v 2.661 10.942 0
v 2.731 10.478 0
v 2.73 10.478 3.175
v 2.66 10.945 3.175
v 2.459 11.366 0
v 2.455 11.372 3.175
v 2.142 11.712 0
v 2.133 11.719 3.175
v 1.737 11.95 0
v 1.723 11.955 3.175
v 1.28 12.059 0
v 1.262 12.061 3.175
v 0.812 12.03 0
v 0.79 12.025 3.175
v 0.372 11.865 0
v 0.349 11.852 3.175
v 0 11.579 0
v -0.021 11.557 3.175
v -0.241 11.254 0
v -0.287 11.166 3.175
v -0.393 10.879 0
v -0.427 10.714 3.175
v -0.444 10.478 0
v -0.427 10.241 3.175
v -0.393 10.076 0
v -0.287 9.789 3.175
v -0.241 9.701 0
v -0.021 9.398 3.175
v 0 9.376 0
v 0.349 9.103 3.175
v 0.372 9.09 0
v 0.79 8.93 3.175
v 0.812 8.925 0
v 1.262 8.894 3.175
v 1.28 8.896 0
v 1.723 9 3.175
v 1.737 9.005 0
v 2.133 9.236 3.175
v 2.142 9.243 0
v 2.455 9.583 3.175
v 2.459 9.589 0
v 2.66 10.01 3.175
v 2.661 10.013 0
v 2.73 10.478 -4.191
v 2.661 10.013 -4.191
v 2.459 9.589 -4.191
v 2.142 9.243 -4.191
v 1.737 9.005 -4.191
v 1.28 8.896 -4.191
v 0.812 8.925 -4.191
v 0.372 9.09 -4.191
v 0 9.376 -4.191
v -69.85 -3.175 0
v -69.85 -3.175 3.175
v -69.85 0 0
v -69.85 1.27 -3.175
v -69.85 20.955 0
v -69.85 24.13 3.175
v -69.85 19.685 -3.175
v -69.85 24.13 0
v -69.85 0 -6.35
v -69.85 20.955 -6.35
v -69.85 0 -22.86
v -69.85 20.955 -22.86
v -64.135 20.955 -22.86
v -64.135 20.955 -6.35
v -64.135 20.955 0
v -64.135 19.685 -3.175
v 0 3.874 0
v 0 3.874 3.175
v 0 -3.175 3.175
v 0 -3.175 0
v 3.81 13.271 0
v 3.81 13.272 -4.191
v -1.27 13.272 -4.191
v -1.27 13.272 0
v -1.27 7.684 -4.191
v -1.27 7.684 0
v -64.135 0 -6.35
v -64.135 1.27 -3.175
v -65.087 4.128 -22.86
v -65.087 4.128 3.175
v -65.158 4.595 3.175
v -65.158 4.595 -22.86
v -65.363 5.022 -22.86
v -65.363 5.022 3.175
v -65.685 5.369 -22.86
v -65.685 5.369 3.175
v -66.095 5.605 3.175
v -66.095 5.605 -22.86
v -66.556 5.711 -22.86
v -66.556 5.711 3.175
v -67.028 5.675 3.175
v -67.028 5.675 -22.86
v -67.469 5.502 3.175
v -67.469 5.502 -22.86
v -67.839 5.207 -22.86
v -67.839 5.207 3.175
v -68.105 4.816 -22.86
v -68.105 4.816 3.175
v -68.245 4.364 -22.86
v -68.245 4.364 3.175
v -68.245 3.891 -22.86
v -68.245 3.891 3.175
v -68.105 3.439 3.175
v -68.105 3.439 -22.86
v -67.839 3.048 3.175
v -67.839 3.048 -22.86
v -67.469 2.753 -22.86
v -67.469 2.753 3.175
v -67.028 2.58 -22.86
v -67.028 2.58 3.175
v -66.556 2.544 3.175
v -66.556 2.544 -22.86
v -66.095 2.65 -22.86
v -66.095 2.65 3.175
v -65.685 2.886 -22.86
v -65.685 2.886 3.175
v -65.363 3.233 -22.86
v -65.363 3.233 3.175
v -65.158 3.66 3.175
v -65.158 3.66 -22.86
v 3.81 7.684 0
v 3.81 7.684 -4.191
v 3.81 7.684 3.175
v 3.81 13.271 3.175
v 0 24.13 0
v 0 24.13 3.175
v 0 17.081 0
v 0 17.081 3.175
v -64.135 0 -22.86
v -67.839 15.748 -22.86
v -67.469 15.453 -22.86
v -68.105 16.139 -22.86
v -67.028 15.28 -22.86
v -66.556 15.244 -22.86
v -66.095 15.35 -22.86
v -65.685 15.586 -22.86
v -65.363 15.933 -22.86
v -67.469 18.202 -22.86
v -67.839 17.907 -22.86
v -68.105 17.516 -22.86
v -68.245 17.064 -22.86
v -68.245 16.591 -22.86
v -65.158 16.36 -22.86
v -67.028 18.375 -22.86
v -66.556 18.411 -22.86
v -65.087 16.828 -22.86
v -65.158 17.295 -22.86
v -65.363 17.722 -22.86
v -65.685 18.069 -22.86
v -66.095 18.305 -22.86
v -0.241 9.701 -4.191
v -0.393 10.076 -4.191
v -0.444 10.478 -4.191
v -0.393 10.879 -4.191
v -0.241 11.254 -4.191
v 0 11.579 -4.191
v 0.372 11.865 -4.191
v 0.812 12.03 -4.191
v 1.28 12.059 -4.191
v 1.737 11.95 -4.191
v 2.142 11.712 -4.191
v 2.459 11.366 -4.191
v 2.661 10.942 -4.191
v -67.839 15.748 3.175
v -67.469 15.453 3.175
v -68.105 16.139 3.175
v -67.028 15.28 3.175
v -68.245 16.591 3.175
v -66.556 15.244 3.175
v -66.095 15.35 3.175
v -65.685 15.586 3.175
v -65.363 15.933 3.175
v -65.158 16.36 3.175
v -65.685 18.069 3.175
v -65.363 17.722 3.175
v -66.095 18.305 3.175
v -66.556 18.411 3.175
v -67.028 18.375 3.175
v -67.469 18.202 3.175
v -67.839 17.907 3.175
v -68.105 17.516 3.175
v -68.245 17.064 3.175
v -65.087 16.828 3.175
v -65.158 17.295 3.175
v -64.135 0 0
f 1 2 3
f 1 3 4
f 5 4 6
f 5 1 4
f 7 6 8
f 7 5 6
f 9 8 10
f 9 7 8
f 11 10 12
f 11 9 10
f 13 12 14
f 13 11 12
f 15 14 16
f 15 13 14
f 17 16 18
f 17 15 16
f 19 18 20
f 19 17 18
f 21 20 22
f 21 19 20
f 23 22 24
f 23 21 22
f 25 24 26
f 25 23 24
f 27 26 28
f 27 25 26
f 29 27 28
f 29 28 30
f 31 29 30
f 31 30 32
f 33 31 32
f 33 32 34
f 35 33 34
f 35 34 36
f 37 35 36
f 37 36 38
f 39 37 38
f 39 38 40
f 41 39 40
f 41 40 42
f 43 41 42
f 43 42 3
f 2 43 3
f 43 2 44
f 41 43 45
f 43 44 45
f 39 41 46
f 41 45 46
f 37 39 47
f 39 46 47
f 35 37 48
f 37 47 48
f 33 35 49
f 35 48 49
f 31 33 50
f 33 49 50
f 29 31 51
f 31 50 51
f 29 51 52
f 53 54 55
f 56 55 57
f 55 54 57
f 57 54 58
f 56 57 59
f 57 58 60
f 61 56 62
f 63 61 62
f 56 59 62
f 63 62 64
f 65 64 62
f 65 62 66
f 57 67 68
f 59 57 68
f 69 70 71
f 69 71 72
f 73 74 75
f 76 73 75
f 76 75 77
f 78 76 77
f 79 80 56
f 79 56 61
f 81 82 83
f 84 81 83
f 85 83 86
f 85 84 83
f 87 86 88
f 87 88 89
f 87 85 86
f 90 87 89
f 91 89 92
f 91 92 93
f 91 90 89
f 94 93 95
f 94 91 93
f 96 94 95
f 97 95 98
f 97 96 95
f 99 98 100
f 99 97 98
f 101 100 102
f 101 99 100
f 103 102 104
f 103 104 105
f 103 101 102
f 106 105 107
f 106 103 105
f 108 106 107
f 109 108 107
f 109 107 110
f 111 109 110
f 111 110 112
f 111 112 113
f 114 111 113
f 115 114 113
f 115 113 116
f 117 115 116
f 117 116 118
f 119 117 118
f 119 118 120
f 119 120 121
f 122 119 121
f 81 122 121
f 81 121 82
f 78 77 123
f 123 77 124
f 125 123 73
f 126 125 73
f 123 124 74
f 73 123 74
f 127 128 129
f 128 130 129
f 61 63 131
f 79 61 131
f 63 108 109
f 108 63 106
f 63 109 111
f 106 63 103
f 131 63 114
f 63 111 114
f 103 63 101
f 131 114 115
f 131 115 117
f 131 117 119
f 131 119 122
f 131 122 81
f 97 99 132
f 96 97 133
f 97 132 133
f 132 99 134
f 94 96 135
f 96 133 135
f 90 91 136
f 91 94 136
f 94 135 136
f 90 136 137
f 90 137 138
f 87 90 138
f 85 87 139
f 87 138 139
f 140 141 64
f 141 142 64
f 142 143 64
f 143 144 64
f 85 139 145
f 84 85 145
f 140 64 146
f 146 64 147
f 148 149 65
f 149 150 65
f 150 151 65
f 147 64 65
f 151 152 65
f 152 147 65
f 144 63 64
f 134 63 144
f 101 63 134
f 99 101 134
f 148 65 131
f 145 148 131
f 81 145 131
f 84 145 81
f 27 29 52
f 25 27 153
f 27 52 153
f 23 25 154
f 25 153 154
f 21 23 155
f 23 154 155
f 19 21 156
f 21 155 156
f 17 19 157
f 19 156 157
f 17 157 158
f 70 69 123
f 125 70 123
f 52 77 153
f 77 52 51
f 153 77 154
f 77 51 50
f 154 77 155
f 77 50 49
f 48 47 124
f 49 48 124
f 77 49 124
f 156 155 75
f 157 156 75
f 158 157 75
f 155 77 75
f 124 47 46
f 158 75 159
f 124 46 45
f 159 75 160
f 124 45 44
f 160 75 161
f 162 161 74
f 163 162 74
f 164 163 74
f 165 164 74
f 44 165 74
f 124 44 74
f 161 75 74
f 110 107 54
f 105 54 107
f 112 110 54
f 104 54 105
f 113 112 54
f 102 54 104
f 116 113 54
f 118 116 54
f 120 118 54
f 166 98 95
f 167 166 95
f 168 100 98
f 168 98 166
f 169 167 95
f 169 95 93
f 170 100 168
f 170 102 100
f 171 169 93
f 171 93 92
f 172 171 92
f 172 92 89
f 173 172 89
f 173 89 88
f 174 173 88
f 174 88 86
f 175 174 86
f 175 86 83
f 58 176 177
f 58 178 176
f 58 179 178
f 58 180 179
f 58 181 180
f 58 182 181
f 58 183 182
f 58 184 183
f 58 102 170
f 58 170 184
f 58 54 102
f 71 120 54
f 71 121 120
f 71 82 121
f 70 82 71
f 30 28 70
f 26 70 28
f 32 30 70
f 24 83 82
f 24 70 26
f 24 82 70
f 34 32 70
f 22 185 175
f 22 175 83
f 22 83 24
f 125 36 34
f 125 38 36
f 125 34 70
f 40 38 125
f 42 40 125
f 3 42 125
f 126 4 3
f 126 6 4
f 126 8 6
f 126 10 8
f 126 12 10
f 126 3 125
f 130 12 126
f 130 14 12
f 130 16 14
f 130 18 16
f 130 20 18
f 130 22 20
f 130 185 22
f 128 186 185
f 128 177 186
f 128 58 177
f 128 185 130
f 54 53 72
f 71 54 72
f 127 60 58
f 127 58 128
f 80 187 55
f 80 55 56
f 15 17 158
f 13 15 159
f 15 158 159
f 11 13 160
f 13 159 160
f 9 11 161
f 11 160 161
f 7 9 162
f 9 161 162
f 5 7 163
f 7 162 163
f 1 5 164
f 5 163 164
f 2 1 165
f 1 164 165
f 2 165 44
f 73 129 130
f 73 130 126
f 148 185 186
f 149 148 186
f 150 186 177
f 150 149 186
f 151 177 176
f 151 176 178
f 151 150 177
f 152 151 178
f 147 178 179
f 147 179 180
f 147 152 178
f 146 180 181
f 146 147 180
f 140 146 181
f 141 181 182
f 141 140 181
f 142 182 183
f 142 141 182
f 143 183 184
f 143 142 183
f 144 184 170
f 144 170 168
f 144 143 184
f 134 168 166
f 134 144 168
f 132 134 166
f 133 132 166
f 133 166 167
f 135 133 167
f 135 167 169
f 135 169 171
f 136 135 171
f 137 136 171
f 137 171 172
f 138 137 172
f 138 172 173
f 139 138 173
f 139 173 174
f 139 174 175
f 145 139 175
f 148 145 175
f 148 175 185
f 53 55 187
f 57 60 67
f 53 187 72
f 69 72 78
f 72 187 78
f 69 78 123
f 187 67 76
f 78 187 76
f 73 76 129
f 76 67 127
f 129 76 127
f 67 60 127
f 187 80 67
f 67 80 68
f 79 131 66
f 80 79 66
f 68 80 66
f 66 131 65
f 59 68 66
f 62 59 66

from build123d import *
from build123d.topology import SkipClean

# Parameters (mm, degrees)
SKETCH1_R           = 1.5875
BOSS_EXTRUDE1_DEPTH = 3.175
BOSS_EXTRUDE2_START = -22.86
SKETCH1_3_W         = 5.715
SKETCH1_3_H         = 20.955
SKETCH1_3_R         = 1.5875
BOSS_EXTRUDE2_DEPTH = 22.86
BOSS_EXTRUDE3_START = -4.191
BOSS_EXTRUDE3_DEPTH = 4.191
CHAMFER1_SIZE       = 3.81
SKETCH3_W           = 69.85
SKETCH3_H           = 3.175
BOSS_EXTRUDE4_DEPTH = 3.175
CUT_EXTRUDE6_DEPTH  = 76.639668991


with BuildPart() as part:
    # Sketch1 → Boss-Extrude1 (new body)
    with BuildSketch(Plane.XY):
        Polygon((0, 20.955), (-69.85, 20.955), (-69.85, 0), (0, 0), (0, 7.6835), (3.81, 7.6835), (3.81, 13.2715), (0, 13.2715), align=None)
        with Locations((-66.675, 16.8275)):
            Circle(SKETCH1_R, mode=Mode.SUBTRACT)
        with Locations((-66.675, 4.1275)):
            Circle(SKETCH1_R, mode=Mode.SUBTRACT)
        with Locations((1.143, 10.4775)):
            Circle(SKETCH1_R, mode=Mode.SUBTRACT)
    extrude(amount=BOSS_EXTRUDE1_DEPTH)

    # Sketch1<3> → Boss-Extrude2 (add)
    with BuildSketch(Plane.XY.offset(BOSS_EXTRUDE2_START)):
        with Locations((-66.9925, 10.4775)):
            Rectangle(SKETCH1_3_W, SKETCH1_3_H)
        with Locations((-66.675, 4.1275)):
            Circle(SKETCH1_3_R, mode=Mode.SUBTRACT)
        with Locations((-66.675, 16.8275)):
            Circle(SKETCH1_3_R, mode=Mode.SUBTRACT)
    extrude(amount=BOSS_EXTRUDE2_DEPTH)

    # Sketch1<4> → Boss-Extrude3 (add)
    with SkipClean():  # the faces are left unmerged after this step: merging them gives an invalid solid
        with BuildSketch(Plane.XY.offset(BOSS_EXTRUDE3_START)):
            with BuildLine():
                Line((3.81, 13.2715), (0, 13.2715))
                Line((0, 13.2715), (0, 11.579183825))
                ThreePointArc((0, 11.579183825), (1.73698811, 11.949686936), (2.7305, 10.4775))
                ThreePointArc((2.7305, 10.4775), (1.73698811, 9.005313064), (0, 9.375816175))
                Line((0, 9.375816175), (0, 7.6835))
                Line((0, 7.6835), (3.81, 7.6835))
                Line((3.81, 7.6835), (3.81, 13.2715))
            make_face()
            with BuildLine():
                Line((0, 11.579183825), (0, 13.2715))
                Line((0, 13.2715), (-1.27, 13.2715))
                Line((-1.27, 13.2715), (-1.27, 7.6835))
                Line((-1.27, 7.6835), (0, 7.6835))
                Line((0, 7.6835), (0, 9.375816175))
                ThreePointArc((0, 9.375816175), (-0.4445, 10.4775), (0, 11.579183825))
            make_face()
        extrude(amount=BOSS_EXTRUDE3_DEPTH)

    # Chamfer1
    # the kernel refuses this chamfer: 3.81 mm, written as the material it adds along each edge
    with BuildSketch(Plane(origin=(0, 7.6835, 0), x_dir=(-0.027495876610586462, -0.9996219169112968, 0), z_dir=(0, 0, 1))) as chamfer1_piece_1_section:
        Polygon((CHAMFER1_SIZE * 0.999621916911, CHAMFER1_SIZE * 0.0274958766106), (-CHAMFER1_SIZE * 0.0274958766106, CHAMFER1_SIZE * 0.999621916911), (0, 0), align=None)
    chamfer1_piece_1 = extrude(amount=3.175, mode=Mode.PRIVATE)
    chamfer1_piece_1 = split(chamfer1_piece_1, bisect_by=Plane(origin=(3.81, 6.424660172, 1.5875), z_dir=(-1, 0, 0)), keep=Keep.TOP, mode=Mode.PRIVATE)
    add(chamfer1_piece_1)
    with BuildSketch(Plane(origin=(0, 13.2715, 0), x_dir=(-0.027495876610586452, 0.9996219169112968, 0), z_dir=(0, 0, 1))) as chamfer1_piece_2_section:
        Polygon((CHAMFER1_SIZE * 0.999621916911, -CHAMFER1_SIZE * 0.0274958766106), (-CHAMFER1_SIZE * 0.0274958766106, -CHAMFER1_SIZE * 0.999621916911), (0, 0), align=None)
    chamfer1_piece_2 = extrude(amount=3.175, mode=Mode.PRIVATE)
    chamfer1_piece_2 = split(chamfer1_piece_2, bisect_by=Plane(origin=(3.81, 14.530339828, 1.5875), z_dir=(-1, 0, 0)), keep=Keep.TOP, mode=Mode.PRIVATE)
    add(chamfer1_piece_2)

    # Sketch3 → Boss-Extrude4 (add)
    with BuildSketch(Plane(origin=(0, 20.955, 0), x_dir=(1, 0, 0), z_dir=(0, 1, 0))):
        with Locations((-34.925, -1.5875)):
            Rectangle(SKETCH3_W, SKETCH3_H)
    boss_extrude4 = extrude(amount=BOSS_EXTRUDE4_DEPTH)

    # Mirror1: Boss-Extrude4 across plane
    add(boss_extrude4.mirror(Plane(origin=(0, 10.4775, 0), x_dir=(0, 0, 1), z_dir=(0, -1, 0))))

    # Sketch6 → Cut-Extrude6 (cut, through all)
    with BuildSketch(Plane(origin=(-64.135, 0, 0), x_dir=(0, 0, -1), z_dir=(1, 0, 0))):
        Polygon((0, 20.955), (3.175, 19.685), (6.35, 20.955), align=None)
        Polygon((3.175, 1.27), (6.35, 0), (0, 0), align=None)
    extrude(amount=-CUT_EXTRUDE6_DEPTH, mode=Mode.SUBTRACT)


solid = part.part
